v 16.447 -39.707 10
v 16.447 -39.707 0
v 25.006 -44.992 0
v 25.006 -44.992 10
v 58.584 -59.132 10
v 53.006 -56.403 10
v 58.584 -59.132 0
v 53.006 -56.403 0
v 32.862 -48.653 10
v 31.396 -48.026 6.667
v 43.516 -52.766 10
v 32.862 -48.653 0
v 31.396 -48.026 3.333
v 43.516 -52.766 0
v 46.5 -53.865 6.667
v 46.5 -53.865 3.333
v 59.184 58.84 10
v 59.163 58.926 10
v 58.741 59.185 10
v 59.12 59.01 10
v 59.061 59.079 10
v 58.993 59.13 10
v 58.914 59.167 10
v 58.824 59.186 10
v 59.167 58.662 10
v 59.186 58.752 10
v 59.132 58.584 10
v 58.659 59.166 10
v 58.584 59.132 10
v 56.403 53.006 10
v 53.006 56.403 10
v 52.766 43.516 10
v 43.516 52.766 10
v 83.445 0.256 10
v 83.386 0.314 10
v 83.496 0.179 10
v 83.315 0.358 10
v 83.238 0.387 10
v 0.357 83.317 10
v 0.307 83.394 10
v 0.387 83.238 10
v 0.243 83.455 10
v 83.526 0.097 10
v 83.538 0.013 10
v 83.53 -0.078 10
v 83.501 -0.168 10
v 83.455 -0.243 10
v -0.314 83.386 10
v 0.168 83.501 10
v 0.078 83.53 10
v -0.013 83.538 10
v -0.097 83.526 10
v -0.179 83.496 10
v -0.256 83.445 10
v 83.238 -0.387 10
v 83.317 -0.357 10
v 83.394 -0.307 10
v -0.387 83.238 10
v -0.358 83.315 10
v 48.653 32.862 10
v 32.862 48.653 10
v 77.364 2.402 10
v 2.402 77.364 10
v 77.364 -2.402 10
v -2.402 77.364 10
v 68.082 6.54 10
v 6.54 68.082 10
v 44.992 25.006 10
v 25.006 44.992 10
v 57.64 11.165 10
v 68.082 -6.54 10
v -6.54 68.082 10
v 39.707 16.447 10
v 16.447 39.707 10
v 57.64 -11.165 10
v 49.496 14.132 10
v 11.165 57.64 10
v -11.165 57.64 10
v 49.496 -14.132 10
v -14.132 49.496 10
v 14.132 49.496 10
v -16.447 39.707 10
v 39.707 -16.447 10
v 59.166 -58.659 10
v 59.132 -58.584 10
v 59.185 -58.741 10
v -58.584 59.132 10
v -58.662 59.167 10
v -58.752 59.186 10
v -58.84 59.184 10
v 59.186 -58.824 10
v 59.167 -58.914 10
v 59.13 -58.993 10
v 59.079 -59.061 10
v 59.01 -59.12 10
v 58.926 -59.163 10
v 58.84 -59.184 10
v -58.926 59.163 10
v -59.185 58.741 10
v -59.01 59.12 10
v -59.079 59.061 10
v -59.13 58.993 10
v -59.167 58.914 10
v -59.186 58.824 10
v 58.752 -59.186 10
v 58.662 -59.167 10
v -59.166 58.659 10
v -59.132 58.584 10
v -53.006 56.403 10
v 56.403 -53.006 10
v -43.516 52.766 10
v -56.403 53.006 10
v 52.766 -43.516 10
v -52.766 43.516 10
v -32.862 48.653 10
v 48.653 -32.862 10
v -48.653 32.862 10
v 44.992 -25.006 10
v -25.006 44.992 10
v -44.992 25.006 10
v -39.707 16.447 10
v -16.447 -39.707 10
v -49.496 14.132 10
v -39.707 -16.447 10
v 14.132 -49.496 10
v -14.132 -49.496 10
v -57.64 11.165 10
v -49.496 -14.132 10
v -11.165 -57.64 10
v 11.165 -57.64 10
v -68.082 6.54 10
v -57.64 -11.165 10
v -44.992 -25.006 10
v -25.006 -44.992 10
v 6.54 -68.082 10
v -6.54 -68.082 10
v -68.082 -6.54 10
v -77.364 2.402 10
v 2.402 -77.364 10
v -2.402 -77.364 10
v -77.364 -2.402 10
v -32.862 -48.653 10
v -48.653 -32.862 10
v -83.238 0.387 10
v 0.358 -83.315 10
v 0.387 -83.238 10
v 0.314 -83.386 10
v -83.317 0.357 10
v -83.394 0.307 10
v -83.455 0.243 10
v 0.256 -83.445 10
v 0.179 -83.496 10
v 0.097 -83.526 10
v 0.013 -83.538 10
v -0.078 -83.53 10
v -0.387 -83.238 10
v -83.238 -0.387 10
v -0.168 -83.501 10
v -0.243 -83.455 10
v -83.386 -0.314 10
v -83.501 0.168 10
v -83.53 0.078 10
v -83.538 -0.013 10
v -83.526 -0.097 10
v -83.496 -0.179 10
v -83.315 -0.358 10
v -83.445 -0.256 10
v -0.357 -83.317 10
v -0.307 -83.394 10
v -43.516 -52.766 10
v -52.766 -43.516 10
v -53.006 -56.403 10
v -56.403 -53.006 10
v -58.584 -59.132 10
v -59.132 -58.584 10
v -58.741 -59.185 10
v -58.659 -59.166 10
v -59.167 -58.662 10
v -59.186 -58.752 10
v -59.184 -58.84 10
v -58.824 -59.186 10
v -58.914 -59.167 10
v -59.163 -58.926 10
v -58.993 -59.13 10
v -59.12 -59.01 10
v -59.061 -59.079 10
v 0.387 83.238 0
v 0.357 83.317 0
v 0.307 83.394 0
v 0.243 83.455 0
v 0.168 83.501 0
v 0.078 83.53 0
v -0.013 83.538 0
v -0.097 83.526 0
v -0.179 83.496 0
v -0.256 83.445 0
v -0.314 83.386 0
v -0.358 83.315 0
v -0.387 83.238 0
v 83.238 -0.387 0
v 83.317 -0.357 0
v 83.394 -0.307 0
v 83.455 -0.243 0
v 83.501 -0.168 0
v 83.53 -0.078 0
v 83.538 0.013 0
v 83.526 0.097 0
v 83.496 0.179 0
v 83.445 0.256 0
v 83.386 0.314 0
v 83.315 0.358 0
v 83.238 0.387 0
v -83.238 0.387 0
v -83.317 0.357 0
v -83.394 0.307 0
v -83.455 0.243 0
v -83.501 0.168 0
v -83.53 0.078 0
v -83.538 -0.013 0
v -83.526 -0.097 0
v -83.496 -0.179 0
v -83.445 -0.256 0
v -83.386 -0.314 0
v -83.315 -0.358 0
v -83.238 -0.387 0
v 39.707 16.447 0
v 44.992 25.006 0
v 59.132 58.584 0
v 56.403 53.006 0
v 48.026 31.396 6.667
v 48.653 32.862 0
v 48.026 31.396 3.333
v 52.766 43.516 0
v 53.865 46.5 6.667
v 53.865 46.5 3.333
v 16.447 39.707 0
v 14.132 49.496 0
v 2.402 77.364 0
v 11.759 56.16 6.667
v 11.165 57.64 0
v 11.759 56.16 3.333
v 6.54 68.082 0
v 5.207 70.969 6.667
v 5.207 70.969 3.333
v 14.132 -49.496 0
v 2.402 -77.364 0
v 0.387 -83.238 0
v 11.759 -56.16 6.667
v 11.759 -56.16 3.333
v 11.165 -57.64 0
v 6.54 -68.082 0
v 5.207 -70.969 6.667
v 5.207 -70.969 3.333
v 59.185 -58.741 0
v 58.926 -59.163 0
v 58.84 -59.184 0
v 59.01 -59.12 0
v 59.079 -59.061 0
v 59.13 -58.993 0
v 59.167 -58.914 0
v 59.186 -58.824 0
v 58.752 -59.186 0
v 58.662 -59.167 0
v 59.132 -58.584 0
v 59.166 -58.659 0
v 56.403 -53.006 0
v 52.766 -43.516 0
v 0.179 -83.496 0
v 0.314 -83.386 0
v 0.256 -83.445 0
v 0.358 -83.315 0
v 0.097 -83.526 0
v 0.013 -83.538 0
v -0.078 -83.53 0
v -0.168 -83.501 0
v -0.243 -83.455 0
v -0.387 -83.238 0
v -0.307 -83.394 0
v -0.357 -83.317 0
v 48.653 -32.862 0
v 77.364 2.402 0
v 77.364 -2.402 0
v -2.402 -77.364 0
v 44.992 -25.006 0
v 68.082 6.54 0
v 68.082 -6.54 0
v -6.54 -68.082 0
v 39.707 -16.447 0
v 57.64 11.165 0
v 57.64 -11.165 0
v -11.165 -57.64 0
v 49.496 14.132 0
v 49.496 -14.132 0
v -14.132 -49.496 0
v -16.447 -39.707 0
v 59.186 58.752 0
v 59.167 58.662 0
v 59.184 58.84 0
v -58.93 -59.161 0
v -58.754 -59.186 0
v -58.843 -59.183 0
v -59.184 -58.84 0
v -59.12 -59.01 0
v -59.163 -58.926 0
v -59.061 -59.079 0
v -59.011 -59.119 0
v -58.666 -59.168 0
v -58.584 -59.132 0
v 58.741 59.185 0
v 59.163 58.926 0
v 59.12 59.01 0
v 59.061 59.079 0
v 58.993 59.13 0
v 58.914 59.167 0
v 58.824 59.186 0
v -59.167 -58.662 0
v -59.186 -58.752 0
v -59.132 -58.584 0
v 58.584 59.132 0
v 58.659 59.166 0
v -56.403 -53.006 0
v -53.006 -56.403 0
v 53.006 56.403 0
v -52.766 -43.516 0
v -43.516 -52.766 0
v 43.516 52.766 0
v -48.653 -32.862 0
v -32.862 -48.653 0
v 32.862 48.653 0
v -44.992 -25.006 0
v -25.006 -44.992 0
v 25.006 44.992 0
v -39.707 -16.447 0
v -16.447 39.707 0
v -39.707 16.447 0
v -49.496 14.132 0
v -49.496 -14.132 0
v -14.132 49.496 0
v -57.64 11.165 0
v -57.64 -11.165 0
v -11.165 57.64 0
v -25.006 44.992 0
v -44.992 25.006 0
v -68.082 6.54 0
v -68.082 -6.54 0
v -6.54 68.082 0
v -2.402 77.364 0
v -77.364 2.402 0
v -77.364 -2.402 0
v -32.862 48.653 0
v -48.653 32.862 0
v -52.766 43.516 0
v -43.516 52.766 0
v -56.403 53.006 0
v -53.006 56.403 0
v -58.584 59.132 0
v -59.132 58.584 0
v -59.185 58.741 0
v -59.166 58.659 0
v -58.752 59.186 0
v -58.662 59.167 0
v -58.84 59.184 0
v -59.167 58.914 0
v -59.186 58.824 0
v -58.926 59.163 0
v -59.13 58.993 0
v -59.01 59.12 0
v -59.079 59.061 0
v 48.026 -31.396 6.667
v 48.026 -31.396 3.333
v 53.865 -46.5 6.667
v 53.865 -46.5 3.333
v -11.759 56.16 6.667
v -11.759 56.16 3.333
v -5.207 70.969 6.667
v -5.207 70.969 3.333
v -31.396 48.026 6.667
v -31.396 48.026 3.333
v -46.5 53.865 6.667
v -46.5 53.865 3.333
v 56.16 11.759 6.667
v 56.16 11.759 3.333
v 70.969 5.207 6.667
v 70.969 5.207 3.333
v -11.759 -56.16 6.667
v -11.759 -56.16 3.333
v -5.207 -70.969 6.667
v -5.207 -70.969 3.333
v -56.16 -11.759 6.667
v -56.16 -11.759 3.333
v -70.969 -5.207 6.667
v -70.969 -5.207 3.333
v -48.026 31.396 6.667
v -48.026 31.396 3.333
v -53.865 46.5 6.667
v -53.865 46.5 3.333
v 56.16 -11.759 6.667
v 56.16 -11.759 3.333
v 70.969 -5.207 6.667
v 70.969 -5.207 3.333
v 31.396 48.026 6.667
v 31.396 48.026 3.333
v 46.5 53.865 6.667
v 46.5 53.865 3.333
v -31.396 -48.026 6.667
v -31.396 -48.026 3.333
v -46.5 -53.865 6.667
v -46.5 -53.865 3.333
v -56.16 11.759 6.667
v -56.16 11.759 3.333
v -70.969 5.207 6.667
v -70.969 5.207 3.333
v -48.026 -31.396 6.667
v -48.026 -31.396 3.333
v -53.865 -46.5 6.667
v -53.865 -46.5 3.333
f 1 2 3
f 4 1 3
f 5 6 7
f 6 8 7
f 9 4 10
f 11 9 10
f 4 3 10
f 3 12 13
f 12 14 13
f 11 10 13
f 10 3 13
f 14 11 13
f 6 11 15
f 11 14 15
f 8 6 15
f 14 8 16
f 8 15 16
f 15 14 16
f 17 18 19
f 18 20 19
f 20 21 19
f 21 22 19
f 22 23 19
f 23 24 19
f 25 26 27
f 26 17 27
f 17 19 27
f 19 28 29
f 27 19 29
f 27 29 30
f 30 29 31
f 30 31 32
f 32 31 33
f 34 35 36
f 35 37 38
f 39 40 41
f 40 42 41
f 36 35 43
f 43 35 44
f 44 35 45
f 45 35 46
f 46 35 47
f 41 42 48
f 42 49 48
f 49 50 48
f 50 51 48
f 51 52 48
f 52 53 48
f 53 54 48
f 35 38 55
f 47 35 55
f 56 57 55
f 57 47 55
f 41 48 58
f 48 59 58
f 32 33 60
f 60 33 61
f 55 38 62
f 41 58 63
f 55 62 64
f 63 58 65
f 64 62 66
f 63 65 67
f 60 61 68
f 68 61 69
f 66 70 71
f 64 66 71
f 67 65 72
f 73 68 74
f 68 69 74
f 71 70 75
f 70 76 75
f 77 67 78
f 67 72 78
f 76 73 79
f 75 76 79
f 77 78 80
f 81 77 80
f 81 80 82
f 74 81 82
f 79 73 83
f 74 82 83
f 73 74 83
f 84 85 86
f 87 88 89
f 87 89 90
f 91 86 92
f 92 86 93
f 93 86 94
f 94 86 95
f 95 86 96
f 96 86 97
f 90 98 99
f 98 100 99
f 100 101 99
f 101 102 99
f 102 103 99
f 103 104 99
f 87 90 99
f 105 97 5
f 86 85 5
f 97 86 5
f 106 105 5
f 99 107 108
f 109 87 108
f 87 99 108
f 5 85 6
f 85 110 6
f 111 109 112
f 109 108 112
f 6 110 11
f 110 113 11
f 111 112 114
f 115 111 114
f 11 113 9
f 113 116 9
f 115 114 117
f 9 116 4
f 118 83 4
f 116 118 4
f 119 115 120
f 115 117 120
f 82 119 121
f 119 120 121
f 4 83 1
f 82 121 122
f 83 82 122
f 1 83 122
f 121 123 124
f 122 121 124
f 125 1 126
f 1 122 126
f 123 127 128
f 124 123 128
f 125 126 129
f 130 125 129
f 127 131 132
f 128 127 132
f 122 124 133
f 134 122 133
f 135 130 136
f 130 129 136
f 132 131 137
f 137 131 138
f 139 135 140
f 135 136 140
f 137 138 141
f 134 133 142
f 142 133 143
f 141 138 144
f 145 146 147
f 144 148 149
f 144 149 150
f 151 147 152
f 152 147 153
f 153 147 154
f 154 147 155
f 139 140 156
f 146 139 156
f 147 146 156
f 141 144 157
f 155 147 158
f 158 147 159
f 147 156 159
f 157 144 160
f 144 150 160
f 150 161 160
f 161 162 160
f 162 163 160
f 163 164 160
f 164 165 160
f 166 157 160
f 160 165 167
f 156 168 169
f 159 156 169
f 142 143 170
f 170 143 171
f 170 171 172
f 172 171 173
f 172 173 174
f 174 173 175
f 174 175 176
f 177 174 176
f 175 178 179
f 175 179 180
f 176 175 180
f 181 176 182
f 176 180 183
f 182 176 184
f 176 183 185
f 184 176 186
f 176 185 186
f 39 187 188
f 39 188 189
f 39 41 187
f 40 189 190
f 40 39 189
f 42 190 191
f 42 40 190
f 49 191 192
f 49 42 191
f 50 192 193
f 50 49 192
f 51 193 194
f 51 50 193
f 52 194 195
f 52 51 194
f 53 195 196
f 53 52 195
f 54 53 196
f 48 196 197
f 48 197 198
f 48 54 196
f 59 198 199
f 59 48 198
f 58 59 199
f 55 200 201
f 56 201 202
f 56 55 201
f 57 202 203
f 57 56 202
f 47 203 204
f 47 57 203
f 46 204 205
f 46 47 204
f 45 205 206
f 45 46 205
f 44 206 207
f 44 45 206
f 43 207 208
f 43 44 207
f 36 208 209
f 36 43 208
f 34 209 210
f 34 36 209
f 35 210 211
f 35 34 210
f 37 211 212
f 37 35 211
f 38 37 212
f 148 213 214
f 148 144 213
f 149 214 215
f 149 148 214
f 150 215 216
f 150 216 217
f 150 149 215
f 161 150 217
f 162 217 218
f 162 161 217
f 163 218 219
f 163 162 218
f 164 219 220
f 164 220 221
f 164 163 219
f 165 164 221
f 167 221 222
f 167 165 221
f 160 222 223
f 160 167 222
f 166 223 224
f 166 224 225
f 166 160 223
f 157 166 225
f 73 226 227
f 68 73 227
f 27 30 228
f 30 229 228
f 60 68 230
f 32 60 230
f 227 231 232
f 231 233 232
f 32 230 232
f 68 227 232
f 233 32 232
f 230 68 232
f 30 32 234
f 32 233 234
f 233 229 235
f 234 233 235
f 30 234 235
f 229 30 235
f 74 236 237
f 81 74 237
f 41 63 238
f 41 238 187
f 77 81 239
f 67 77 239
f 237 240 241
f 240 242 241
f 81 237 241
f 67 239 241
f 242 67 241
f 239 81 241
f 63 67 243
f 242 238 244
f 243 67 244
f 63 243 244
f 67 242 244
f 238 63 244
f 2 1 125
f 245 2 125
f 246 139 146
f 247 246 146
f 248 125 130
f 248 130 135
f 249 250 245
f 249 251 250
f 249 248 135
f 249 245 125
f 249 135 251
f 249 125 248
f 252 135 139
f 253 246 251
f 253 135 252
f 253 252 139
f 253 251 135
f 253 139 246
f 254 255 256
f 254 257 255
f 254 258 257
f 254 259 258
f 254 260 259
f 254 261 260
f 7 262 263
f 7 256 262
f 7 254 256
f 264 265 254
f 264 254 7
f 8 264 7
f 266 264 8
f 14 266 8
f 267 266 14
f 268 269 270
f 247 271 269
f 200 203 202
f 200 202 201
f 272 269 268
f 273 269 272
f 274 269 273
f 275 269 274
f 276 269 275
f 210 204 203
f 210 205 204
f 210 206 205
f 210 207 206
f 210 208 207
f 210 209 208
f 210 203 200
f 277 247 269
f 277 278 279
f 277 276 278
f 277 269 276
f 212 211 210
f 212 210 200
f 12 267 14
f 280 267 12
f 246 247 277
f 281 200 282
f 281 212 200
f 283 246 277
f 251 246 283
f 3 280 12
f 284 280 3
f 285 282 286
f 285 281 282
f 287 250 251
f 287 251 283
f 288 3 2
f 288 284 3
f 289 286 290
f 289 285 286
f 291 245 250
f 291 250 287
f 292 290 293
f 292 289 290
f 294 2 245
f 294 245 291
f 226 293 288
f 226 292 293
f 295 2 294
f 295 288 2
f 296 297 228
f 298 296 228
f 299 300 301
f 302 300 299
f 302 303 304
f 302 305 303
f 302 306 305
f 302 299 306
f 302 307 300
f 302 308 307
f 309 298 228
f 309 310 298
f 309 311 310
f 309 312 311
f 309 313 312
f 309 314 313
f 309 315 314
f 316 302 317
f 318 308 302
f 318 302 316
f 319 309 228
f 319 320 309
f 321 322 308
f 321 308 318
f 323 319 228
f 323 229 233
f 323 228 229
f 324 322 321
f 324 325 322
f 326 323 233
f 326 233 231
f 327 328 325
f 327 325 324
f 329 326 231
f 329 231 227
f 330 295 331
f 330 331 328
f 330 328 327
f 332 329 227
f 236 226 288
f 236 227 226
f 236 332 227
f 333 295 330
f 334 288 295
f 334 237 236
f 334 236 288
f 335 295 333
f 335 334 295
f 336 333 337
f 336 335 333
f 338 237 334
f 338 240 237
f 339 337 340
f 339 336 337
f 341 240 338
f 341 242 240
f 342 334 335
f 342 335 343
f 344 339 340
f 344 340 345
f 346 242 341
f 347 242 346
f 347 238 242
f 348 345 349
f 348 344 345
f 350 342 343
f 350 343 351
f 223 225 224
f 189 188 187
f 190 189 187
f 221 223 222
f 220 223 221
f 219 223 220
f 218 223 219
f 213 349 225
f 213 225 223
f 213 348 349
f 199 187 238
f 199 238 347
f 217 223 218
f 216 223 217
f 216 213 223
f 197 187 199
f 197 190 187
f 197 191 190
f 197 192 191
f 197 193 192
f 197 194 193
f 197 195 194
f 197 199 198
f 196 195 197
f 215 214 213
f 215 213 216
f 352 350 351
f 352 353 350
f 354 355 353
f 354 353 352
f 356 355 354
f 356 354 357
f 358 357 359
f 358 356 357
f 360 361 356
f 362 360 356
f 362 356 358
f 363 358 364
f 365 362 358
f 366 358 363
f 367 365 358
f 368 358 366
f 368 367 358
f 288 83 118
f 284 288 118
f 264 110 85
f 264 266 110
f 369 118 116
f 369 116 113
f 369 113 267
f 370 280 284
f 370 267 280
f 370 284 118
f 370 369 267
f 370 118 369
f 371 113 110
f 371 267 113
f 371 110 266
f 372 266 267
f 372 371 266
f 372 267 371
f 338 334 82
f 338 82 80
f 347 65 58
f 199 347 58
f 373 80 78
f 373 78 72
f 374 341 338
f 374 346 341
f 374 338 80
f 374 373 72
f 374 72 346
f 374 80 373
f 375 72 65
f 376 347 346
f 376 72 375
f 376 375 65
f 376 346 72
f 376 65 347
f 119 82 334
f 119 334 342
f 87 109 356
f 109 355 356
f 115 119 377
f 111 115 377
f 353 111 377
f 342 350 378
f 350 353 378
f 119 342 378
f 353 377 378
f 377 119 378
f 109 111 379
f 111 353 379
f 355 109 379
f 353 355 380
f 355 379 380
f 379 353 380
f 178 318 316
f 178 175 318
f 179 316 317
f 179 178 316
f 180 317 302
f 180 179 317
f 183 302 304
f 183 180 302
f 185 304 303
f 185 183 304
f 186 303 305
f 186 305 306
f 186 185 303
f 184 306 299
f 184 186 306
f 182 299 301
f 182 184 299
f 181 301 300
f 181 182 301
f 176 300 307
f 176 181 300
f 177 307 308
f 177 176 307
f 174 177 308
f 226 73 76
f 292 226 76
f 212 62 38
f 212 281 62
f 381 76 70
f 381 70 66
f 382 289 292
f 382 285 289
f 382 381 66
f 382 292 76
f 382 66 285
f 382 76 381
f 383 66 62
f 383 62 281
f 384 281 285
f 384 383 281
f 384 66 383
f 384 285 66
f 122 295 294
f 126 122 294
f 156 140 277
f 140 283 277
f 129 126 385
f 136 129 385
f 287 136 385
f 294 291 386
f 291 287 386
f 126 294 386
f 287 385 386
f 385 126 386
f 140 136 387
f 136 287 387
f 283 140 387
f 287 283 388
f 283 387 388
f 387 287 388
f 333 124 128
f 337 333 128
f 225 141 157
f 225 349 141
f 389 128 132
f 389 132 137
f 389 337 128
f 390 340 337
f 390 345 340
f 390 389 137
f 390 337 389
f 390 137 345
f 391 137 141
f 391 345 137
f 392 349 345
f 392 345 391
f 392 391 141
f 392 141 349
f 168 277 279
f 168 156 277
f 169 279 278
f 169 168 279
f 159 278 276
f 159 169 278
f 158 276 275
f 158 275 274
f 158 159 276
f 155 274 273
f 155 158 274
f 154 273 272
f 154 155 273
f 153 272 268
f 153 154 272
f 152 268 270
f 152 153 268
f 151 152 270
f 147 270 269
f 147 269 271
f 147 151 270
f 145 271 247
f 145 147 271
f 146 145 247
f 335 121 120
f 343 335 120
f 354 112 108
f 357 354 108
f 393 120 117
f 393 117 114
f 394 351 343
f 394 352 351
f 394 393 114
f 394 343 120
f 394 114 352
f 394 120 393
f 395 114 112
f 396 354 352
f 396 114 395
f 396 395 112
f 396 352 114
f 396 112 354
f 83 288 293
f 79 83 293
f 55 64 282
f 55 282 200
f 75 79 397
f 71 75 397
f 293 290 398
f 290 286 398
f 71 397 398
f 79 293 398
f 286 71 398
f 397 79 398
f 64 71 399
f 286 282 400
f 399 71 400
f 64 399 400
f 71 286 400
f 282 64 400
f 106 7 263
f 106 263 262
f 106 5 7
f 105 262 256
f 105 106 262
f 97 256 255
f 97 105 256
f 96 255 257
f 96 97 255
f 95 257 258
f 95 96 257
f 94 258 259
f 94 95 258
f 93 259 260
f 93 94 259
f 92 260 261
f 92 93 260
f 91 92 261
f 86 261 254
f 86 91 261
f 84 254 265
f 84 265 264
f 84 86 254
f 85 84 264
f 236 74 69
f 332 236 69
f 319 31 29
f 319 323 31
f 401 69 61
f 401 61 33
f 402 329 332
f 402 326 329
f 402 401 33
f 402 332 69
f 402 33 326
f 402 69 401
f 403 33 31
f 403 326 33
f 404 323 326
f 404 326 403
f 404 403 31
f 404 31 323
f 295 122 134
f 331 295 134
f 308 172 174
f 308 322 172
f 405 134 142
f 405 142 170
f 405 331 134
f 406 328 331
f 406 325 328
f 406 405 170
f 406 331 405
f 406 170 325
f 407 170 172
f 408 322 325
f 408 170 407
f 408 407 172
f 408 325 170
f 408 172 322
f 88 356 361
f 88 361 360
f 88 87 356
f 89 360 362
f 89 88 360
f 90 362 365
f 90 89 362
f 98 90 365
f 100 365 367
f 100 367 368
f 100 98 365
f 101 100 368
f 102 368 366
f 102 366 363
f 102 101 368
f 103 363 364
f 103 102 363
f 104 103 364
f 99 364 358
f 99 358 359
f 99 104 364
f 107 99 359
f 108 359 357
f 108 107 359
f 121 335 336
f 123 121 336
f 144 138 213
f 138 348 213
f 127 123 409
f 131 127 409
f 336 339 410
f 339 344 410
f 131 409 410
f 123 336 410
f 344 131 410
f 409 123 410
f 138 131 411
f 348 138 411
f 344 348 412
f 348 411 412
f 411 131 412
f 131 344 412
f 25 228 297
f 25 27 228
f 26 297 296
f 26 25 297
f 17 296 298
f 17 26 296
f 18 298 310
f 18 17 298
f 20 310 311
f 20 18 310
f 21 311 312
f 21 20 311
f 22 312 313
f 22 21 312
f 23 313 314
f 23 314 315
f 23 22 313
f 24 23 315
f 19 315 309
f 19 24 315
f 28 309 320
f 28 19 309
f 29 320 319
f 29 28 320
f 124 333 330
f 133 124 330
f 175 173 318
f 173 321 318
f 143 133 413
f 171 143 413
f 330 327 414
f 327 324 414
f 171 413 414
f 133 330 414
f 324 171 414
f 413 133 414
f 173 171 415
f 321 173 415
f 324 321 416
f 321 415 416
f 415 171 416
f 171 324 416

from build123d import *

# Parameters (mm, degrees)
F1_DEPTH = 10
F2_COUNT = 8
F3_R     = 0.4


with BuildPart() as f1:
    # F0 (on Top) → F1 (new body)
    with BuildSketch(Plane.XY):
        with BuildLine():
            add(Edge.make_bspline(
                [(-14.9177111461, 20.0614529425), (-23.5650084882, 44.8479673469), (-2.5884105388, 70.4783619432), (0, 85)],
                knots=[18.3724715396, 18.3724715396, 18.3724715396, 18.3724715396, 85, 85, 85, 85], degree=3))
            ThreePointArc((-14.9177111461, 20.0614529425), (-7.8569611313, 23.7332711985), (0, 25))
            Line((0, 25), (0, 85))
        make_face()
        with BuildLine():
            ThreePointArc((0, 25), (7.8569611313, 23.7332711985), (14.9177111461, 20.0614529425))
            add(Edge.make_bspline(
                [(14.9177111461, 20.0614529425), (23.5650084882, 44.8479673469), (2.5884105388, 70.4783619432), (0, 85)],
                knots=[18.3724715396, 18.3724715396, 18.3724715396, 18.3724715396, 85, 85, 85, 85], degree=3))
            Line((0, 85), (0, 25))
        make_face()
        with BuildLine():
            add(Edge.make_bspline(
                [(0, 0), (7.8962181087, 6.4559084388), (12.5332279154, 13.2265974258), (14.9177111461, 20.0614529425)],
                knots=[0, 0, 0, 0, 18.3724715396, 18.3724715396, 18.3724715396, 18.3724715396], degree=3))
            ThreePointArc((14.9177111461, 20.0614529425), (7.8569611313, 23.7332711985), (0, 25))
            ThreePointArc((0, 25), (-7.8569611313, 23.7332711985), (-14.9177111461, 20.0614529425))
            add(Edge.make_bspline(
                [(0, 0), (-7.8962181087, 6.4559084388), (-12.5332279154, 13.2265974258), (-14.9177111461, 20.0614529425)],
                knots=[0, 0, 0, 0, 18.3724715396, 18.3724715396, 18.3724715396, 18.3724715396], degree=3))
        make_face()
    extrude(amount=F1_DEPTH)

    # F2: F1 ×8 about axis
    f2_axis = Axis((0, 0, 5), (0, 0, -1))


with BuildPart() as f1_1:
    add(f1.part)
    for i in range(1, F2_COUNT):
        add(f1.part.rotate(f2_axis, i * 360 / F2_COUNT))

    # F3
    f3_edges = [f1_1.edges().sort_by_distance(p)[0] for p in [
        (60.104076, 60.104076, 5),
        (85, 0, 5),
        (60.104076, -60.104076, 5),
        (0, -85, 5),
        (0, 85, 5),
        (-60.104076, 60.104076, 5),
        (-85, 0, 5),
        (-60.104076, -60.104076, 5),
    ]]
    fillet(f3_edges, radius=F3_R)


solid = f1_1.part
